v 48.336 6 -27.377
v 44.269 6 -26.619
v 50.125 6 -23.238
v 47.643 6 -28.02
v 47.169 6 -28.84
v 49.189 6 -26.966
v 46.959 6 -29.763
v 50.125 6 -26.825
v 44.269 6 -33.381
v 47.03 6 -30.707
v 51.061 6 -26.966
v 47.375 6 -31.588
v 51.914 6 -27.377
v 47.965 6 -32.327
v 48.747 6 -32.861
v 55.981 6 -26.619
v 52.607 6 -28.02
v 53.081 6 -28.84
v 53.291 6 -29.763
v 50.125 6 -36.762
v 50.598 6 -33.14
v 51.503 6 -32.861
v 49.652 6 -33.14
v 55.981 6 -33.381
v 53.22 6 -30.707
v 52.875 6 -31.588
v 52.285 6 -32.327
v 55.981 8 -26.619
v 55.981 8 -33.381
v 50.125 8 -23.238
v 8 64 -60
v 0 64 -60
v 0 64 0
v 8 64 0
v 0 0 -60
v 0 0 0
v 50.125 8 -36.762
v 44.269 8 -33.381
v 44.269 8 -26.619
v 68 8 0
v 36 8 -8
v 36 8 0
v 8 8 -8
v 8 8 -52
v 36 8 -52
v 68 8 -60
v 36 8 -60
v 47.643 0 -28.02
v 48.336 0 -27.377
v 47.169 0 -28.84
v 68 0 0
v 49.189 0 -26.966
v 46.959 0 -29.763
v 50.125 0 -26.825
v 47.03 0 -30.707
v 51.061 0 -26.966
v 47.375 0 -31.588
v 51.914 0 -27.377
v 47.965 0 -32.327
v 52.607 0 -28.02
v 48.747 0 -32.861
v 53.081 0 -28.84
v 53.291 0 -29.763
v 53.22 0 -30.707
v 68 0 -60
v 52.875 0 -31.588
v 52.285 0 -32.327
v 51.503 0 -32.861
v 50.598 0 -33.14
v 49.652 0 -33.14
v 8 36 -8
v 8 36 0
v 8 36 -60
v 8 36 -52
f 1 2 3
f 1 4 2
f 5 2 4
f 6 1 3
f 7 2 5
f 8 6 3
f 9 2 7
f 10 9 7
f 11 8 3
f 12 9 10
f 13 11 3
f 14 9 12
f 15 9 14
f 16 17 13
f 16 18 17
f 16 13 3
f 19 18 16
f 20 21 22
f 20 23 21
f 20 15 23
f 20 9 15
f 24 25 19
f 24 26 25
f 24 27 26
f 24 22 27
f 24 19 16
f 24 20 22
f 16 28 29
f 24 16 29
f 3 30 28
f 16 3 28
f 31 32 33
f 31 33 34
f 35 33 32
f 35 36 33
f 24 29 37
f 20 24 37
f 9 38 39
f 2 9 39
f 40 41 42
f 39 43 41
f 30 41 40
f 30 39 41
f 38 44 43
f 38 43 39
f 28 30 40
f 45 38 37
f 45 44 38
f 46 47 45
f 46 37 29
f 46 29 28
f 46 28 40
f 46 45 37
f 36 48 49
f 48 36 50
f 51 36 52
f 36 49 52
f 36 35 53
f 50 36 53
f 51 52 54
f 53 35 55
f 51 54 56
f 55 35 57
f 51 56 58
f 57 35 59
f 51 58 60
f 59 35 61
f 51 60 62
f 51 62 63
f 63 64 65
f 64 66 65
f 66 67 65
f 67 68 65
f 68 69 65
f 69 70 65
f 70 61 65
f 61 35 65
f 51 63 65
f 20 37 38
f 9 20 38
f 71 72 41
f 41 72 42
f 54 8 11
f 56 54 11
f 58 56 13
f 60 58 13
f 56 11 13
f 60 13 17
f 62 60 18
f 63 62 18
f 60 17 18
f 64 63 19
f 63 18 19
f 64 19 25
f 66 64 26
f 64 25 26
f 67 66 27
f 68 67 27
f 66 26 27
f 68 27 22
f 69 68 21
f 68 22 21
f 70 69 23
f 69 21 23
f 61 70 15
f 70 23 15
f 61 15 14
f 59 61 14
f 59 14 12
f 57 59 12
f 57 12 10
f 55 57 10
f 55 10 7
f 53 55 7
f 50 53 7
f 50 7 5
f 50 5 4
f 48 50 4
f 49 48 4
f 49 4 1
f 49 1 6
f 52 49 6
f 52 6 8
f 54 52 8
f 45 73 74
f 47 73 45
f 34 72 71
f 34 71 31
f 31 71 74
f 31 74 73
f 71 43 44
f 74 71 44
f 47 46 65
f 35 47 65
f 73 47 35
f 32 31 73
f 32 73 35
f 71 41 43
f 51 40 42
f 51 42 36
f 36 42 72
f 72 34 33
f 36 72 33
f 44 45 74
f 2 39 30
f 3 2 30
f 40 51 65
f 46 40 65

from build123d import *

# Parameters (mm, degrees)
SKETCH1_W           = 68
SKETCH1_H           = 60
BOSS_EXTRUDE1_DEPTH = 8
SKETCH4_W           = 8
SKETCH4_H           = 60
BOSS_EXTRUDE2_DEPTH = 56
SKETCH5_R           = 3.175
CUT_EXTRUDE1_DEPTH  = 8
CUT_EXTRUDE2_DEPTH  = 2
BOSS_EXTRUDE3_DEPTH = 8


with BuildPart() as part:
    # Sketch1 → Boss-Extrude1 (new body)
    with BuildSketch(Plane(origin=(0, 0, 0), x_dir=(1, 0, 0), z_dir=(0, 1, 0))):
        with Locations((34, 30)):
            Rectangle(SKETCH1_W, SKETCH1_H)
    extrude(amount=BOSS_EXTRUDE1_DEPTH)

    # Sketch4 → Boss-Extrude2 (add)
    with BuildSketch(Plane(origin=(0, 8, 0), x_dir=(1, 0, 0), z_dir=(0, 1, 0))):
        with Locations((4, 30)):
            Rectangle(SKETCH4_W, SKETCH4_H)
    extrude(amount=BOSS_EXTRUDE2_DEPTH)

    # Sketch5 → Cut-Extrude1 (cut)
    with BuildSketch(Plane(origin=(0, 8, 0), x_dir=(1, 0, 0), z_dir=(0, 1, 0))):
        with Locations(Location((50.125, 30, 0), (0, 0, 270))):
            Circle(SKETCH5_R)
    extrude(amount=-CUT_EXTRUDE1_DEPTH, mode=Mode.SUBTRACT)

    # Sketch7 → Cut-Extrude2 (cut)
    with BuildSketch(Plane(origin=(0, 8, 0), x_dir=(1, 0, 0), z_dir=(0, 1, 0))):
        Polygon((44.26875, 26.618892486), (50.125, 23.237784972), (55.98125, 26.618892486), (55.98125, 33.381107514), (50.125, 36.762215028), (44.26875, 33.381107514), align=None)
    extrude(amount=-CUT_EXTRUDE2_DEPTH, mode=Mode.SUBTRACT)

    # Sketch8 → Boss-Extrude3 (add)
    with BuildSketch(Plane(origin=(0, 0, -60), x_dir=(-1, 0, 0), z_dir=(0, 0, -1))):
        Polygon((-36, 8), (-8, 8), (-8, 36), align=None)
    boss_extrude3 = extrude(amount=-BOSS_EXTRUDE3_DEPTH)

    # Mirror1: Boss-Extrude3 across plane
    add(boss_extrude3.mirror(Plane(origin=(0, 0, -30), x_dir=(1, 0, 0), z_dir=(0, 0, -1))))


solid = part.part
